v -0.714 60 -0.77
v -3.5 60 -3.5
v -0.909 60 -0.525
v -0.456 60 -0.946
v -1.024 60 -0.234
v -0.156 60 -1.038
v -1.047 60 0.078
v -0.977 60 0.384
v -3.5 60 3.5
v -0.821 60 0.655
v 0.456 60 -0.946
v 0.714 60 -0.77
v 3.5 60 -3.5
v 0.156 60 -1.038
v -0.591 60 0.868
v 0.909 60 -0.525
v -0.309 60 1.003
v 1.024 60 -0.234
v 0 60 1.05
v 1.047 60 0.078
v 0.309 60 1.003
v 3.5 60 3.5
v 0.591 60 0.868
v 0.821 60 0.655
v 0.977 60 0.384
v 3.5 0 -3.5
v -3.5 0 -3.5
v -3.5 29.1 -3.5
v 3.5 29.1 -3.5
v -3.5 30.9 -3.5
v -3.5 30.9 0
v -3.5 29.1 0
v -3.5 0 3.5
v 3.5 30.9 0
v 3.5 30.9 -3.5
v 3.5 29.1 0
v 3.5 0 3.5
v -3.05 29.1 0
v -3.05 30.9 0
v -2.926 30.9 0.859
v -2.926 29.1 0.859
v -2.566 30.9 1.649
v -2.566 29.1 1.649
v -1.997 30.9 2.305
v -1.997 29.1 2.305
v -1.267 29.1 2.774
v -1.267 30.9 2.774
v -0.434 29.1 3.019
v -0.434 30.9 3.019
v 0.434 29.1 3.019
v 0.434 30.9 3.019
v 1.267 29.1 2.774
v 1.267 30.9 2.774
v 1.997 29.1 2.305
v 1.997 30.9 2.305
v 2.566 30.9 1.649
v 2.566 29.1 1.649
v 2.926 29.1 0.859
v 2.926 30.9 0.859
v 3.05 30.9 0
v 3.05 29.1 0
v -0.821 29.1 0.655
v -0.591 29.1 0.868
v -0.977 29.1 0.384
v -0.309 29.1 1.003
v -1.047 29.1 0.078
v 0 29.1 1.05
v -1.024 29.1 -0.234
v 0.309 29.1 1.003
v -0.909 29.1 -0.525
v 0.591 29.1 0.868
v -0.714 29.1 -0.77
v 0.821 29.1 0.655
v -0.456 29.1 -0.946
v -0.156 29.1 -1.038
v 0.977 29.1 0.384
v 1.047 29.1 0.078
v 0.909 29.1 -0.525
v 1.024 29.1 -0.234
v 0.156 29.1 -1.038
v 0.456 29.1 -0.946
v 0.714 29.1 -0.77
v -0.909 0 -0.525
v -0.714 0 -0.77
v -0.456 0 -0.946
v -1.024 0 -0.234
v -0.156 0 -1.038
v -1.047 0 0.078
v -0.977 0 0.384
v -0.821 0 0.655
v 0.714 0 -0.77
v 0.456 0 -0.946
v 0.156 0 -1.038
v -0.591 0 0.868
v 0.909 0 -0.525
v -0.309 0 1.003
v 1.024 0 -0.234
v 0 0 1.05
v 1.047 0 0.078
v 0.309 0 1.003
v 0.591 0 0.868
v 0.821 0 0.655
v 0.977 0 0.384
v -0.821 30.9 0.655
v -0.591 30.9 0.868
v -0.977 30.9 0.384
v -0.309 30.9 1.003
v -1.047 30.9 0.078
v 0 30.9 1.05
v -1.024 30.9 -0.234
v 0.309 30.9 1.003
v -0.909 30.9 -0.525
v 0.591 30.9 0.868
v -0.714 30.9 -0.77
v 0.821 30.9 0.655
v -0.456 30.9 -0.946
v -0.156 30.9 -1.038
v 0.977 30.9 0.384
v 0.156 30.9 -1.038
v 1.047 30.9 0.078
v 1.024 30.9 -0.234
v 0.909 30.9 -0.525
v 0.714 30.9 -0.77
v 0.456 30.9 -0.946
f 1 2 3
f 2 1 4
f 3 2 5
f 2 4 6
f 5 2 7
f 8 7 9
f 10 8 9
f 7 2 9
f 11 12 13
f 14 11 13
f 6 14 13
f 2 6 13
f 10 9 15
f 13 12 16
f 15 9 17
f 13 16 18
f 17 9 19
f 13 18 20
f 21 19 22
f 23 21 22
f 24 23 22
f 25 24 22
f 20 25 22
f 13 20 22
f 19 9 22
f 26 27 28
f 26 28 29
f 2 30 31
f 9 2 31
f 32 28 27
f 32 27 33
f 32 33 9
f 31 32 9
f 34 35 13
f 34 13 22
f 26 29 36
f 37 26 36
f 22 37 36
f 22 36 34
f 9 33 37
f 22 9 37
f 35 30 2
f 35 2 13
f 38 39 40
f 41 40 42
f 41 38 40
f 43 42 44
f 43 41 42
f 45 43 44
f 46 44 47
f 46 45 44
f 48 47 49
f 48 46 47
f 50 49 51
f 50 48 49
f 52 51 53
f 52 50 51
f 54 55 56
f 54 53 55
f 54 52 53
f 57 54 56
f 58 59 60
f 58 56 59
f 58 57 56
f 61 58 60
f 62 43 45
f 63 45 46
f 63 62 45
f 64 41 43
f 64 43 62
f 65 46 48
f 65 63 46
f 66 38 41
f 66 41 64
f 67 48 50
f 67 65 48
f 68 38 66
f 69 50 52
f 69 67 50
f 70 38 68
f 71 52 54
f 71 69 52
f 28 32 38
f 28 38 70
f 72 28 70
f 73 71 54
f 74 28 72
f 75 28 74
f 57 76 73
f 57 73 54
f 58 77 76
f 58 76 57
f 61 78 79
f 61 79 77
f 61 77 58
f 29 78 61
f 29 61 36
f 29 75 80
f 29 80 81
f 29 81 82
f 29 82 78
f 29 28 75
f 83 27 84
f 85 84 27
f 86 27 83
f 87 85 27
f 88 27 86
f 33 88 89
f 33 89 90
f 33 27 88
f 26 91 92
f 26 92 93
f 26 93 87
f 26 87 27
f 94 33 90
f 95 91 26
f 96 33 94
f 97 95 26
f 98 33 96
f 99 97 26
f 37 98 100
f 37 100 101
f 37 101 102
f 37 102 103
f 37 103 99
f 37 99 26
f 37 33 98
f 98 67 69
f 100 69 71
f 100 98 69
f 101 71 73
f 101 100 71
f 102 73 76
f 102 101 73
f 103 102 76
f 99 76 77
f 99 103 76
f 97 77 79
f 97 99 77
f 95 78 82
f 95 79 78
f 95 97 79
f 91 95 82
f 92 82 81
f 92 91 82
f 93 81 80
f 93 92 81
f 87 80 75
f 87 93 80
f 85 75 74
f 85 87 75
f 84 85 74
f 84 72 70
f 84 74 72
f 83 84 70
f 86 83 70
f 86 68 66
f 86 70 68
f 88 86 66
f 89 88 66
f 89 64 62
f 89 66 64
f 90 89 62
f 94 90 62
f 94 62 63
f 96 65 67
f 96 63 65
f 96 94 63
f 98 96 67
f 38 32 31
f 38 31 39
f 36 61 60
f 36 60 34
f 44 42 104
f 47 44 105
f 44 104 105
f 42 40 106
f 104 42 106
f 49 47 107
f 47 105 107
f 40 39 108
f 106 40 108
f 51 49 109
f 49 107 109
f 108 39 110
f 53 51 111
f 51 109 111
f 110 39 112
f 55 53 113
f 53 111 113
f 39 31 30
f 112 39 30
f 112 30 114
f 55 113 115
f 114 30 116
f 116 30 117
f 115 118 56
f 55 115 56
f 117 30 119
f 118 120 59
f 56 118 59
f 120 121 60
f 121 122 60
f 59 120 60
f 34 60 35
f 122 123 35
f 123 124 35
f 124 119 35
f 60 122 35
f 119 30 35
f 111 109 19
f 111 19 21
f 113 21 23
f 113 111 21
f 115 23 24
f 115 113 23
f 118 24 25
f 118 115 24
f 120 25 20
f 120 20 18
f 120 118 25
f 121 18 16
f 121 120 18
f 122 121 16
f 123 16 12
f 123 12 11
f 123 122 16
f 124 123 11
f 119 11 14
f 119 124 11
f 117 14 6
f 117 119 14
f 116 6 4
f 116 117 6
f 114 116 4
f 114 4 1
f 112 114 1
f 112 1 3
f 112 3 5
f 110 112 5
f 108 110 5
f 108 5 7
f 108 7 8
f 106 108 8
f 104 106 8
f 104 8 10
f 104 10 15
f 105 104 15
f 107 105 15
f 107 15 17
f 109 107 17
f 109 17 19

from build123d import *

# Parameters (mm, degrees)
SKETCH1_R               = 3.5
SKETCH1_R_2             = 1.05
BOSS_EXTRUDE1_DEPTH     = 60
CUT_EXTRUDE1_DEPTH      = 0.9
CUT_EXTRUDE1_DEPTH_BACK = 0.9
CUT_EXTRUDE1_START      = -30
SKETCH3_R               = 3.05
CUT_EXTRUDE2_DEPTH      = 0.9
CUT_EXTRUDE2_DEPTH_BACK = 0.9
CUT_EXTRUDE2_START      = -30
SKETCH5_W               = 7
SKETCH5_H               = 7
SKETCH5_R               = 1.05
BOSS_EXTRUDE2_DEPTH     = 60
CUT_EXTRUDE3_DEPTH      = 0.9
CUT_EXTRUDE3_DEPTH_BACK = 0.9
CUT_EXTRUDE3_START      = -30
SKETCH6_R               = 3.05
CUT_EXTRUDE4_DEPTH      = 0.9
CUT_EXTRUDE4_DEPTH_BACK = 0.9
CUT_EXTRUDE4_START      = -30
SKETCH7_W               = 8.533306348
SKETCH7_H               = 4.274424856


with BuildPart() as part:
    # Sketch1 → Boss-Extrude1 (new body)
    with BuildSketch(Plane(origin=(0, 0, 0), x_dir=(1, 0, 0), z_dir=(0, 1, 0))):
        with Locations(Location((0, 0, 0), (0, 0, 270))):
            Circle(SKETCH1_R)
        with Locations(Location((0, 0, 0), (0, 0, 270))):
            Circle(SKETCH1_R_2, mode=Mode.SUBTRACT)
    extrude(amount=BOSS_EXTRUDE1_DEPTH)

    # Sketch3 → Cut-Extrude1 (cut, two sides: drawn at the far end of the back side and taken through both)
    with BuildSketch(Plane(origin=(0, 60, 0), x_dir=(1, 0, 0), z_dir=(0, 1, 0)).offset(CUT_EXTRUDE1_START - CUT_EXTRUDE1_DEPTH_BACK)):
        with Locations(Location((0, 0, 0), (0, 0, 270))):
            Circle(SKETCH3_R)
    extrude(amount=CUT_EXTRUDE1_DEPTH + CUT_EXTRUDE1_DEPTH_BACK, mode=Mode.SUBTRACT)

    # Sketch4 → Cut-Extrude2 (cut, two sides: drawn at the far end of the back side and taken through both)
    with BuildSketch(Plane(origin=(0, 60, 0), x_dir=(1, 0, 0), z_dir=(0, 1, 0)).offset(CUT_EXTRUDE2_START - CUT_EXTRUDE2_DEPTH_BACK)):
        with BuildLine():
            Line((-4.266653174, 0), (4.266653174, 0))
            ThreePointArc((4.266653174, 0), (0, 4.266653174), (-4.266653174, 0))
        make_face()
    extrude(amount=CUT_EXTRUDE2_DEPTH + CUT_EXTRUDE2_DEPTH_BACK, mode=Mode.SUBTRACT)

    # Sketch5 → Boss-Extrude2 (add)
    with BuildSketch(Plane.XZ):
        Rectangle(SKETCH5_W, SKETCH5_H)
        with Locations(Location((0, 0, 0), (0, 0, 90))):
            Circle(SKETCH5_R, mode=Mode.SUBTRACT)
    extrude(amount=-BOSS_EXTRUDE2_DEPTH)

    # Sketch6 → Cut-Extrude3 (cut, two sides: drawn at the far end of the back side and taken through both)
    with BuildSketch(Plane(origin=(0, 60, 0), x_dir=(1, 0, 0), z_dir=(0, 1, 0)).offset(CUT_EXTRUDE3_START - CUT_EXTRUDE3_DEPTH_BACK)):
        with Locations(Location((0, 0, 0), (0, 0, 270))):
            Circle(SKETCH6_R)
    extrude(amount=CUT_EXTRUDE3_DEPTH + CUT_EXTRUDE3_DEPTH_BACK, mode=Mode.SUBTRACT)

    # Sketch7 → Cut-Extrude4 (cut, two sides: drawn at the far end of the back side and taken through both)
    with BuildSketch(Plane(origin=(0, 60, 0), x_dir=(1, 0, 0), z_dir=(0, 1, 0)).offset(CUT_EXTRUDE4_START - CUT_EXTRUDE4_DEPTH_BACK)):
        with Locations((0, 2.137212428)):
            Rectangle(SKETCH7_W, SKETCH7_H)
    extrude(amount=CUT_EXTRUDE4_DEPTH + CUT_EXTRUDE4_DEPTH_BACK, mode=Mode.SUBTRACT)


solid = part.part
